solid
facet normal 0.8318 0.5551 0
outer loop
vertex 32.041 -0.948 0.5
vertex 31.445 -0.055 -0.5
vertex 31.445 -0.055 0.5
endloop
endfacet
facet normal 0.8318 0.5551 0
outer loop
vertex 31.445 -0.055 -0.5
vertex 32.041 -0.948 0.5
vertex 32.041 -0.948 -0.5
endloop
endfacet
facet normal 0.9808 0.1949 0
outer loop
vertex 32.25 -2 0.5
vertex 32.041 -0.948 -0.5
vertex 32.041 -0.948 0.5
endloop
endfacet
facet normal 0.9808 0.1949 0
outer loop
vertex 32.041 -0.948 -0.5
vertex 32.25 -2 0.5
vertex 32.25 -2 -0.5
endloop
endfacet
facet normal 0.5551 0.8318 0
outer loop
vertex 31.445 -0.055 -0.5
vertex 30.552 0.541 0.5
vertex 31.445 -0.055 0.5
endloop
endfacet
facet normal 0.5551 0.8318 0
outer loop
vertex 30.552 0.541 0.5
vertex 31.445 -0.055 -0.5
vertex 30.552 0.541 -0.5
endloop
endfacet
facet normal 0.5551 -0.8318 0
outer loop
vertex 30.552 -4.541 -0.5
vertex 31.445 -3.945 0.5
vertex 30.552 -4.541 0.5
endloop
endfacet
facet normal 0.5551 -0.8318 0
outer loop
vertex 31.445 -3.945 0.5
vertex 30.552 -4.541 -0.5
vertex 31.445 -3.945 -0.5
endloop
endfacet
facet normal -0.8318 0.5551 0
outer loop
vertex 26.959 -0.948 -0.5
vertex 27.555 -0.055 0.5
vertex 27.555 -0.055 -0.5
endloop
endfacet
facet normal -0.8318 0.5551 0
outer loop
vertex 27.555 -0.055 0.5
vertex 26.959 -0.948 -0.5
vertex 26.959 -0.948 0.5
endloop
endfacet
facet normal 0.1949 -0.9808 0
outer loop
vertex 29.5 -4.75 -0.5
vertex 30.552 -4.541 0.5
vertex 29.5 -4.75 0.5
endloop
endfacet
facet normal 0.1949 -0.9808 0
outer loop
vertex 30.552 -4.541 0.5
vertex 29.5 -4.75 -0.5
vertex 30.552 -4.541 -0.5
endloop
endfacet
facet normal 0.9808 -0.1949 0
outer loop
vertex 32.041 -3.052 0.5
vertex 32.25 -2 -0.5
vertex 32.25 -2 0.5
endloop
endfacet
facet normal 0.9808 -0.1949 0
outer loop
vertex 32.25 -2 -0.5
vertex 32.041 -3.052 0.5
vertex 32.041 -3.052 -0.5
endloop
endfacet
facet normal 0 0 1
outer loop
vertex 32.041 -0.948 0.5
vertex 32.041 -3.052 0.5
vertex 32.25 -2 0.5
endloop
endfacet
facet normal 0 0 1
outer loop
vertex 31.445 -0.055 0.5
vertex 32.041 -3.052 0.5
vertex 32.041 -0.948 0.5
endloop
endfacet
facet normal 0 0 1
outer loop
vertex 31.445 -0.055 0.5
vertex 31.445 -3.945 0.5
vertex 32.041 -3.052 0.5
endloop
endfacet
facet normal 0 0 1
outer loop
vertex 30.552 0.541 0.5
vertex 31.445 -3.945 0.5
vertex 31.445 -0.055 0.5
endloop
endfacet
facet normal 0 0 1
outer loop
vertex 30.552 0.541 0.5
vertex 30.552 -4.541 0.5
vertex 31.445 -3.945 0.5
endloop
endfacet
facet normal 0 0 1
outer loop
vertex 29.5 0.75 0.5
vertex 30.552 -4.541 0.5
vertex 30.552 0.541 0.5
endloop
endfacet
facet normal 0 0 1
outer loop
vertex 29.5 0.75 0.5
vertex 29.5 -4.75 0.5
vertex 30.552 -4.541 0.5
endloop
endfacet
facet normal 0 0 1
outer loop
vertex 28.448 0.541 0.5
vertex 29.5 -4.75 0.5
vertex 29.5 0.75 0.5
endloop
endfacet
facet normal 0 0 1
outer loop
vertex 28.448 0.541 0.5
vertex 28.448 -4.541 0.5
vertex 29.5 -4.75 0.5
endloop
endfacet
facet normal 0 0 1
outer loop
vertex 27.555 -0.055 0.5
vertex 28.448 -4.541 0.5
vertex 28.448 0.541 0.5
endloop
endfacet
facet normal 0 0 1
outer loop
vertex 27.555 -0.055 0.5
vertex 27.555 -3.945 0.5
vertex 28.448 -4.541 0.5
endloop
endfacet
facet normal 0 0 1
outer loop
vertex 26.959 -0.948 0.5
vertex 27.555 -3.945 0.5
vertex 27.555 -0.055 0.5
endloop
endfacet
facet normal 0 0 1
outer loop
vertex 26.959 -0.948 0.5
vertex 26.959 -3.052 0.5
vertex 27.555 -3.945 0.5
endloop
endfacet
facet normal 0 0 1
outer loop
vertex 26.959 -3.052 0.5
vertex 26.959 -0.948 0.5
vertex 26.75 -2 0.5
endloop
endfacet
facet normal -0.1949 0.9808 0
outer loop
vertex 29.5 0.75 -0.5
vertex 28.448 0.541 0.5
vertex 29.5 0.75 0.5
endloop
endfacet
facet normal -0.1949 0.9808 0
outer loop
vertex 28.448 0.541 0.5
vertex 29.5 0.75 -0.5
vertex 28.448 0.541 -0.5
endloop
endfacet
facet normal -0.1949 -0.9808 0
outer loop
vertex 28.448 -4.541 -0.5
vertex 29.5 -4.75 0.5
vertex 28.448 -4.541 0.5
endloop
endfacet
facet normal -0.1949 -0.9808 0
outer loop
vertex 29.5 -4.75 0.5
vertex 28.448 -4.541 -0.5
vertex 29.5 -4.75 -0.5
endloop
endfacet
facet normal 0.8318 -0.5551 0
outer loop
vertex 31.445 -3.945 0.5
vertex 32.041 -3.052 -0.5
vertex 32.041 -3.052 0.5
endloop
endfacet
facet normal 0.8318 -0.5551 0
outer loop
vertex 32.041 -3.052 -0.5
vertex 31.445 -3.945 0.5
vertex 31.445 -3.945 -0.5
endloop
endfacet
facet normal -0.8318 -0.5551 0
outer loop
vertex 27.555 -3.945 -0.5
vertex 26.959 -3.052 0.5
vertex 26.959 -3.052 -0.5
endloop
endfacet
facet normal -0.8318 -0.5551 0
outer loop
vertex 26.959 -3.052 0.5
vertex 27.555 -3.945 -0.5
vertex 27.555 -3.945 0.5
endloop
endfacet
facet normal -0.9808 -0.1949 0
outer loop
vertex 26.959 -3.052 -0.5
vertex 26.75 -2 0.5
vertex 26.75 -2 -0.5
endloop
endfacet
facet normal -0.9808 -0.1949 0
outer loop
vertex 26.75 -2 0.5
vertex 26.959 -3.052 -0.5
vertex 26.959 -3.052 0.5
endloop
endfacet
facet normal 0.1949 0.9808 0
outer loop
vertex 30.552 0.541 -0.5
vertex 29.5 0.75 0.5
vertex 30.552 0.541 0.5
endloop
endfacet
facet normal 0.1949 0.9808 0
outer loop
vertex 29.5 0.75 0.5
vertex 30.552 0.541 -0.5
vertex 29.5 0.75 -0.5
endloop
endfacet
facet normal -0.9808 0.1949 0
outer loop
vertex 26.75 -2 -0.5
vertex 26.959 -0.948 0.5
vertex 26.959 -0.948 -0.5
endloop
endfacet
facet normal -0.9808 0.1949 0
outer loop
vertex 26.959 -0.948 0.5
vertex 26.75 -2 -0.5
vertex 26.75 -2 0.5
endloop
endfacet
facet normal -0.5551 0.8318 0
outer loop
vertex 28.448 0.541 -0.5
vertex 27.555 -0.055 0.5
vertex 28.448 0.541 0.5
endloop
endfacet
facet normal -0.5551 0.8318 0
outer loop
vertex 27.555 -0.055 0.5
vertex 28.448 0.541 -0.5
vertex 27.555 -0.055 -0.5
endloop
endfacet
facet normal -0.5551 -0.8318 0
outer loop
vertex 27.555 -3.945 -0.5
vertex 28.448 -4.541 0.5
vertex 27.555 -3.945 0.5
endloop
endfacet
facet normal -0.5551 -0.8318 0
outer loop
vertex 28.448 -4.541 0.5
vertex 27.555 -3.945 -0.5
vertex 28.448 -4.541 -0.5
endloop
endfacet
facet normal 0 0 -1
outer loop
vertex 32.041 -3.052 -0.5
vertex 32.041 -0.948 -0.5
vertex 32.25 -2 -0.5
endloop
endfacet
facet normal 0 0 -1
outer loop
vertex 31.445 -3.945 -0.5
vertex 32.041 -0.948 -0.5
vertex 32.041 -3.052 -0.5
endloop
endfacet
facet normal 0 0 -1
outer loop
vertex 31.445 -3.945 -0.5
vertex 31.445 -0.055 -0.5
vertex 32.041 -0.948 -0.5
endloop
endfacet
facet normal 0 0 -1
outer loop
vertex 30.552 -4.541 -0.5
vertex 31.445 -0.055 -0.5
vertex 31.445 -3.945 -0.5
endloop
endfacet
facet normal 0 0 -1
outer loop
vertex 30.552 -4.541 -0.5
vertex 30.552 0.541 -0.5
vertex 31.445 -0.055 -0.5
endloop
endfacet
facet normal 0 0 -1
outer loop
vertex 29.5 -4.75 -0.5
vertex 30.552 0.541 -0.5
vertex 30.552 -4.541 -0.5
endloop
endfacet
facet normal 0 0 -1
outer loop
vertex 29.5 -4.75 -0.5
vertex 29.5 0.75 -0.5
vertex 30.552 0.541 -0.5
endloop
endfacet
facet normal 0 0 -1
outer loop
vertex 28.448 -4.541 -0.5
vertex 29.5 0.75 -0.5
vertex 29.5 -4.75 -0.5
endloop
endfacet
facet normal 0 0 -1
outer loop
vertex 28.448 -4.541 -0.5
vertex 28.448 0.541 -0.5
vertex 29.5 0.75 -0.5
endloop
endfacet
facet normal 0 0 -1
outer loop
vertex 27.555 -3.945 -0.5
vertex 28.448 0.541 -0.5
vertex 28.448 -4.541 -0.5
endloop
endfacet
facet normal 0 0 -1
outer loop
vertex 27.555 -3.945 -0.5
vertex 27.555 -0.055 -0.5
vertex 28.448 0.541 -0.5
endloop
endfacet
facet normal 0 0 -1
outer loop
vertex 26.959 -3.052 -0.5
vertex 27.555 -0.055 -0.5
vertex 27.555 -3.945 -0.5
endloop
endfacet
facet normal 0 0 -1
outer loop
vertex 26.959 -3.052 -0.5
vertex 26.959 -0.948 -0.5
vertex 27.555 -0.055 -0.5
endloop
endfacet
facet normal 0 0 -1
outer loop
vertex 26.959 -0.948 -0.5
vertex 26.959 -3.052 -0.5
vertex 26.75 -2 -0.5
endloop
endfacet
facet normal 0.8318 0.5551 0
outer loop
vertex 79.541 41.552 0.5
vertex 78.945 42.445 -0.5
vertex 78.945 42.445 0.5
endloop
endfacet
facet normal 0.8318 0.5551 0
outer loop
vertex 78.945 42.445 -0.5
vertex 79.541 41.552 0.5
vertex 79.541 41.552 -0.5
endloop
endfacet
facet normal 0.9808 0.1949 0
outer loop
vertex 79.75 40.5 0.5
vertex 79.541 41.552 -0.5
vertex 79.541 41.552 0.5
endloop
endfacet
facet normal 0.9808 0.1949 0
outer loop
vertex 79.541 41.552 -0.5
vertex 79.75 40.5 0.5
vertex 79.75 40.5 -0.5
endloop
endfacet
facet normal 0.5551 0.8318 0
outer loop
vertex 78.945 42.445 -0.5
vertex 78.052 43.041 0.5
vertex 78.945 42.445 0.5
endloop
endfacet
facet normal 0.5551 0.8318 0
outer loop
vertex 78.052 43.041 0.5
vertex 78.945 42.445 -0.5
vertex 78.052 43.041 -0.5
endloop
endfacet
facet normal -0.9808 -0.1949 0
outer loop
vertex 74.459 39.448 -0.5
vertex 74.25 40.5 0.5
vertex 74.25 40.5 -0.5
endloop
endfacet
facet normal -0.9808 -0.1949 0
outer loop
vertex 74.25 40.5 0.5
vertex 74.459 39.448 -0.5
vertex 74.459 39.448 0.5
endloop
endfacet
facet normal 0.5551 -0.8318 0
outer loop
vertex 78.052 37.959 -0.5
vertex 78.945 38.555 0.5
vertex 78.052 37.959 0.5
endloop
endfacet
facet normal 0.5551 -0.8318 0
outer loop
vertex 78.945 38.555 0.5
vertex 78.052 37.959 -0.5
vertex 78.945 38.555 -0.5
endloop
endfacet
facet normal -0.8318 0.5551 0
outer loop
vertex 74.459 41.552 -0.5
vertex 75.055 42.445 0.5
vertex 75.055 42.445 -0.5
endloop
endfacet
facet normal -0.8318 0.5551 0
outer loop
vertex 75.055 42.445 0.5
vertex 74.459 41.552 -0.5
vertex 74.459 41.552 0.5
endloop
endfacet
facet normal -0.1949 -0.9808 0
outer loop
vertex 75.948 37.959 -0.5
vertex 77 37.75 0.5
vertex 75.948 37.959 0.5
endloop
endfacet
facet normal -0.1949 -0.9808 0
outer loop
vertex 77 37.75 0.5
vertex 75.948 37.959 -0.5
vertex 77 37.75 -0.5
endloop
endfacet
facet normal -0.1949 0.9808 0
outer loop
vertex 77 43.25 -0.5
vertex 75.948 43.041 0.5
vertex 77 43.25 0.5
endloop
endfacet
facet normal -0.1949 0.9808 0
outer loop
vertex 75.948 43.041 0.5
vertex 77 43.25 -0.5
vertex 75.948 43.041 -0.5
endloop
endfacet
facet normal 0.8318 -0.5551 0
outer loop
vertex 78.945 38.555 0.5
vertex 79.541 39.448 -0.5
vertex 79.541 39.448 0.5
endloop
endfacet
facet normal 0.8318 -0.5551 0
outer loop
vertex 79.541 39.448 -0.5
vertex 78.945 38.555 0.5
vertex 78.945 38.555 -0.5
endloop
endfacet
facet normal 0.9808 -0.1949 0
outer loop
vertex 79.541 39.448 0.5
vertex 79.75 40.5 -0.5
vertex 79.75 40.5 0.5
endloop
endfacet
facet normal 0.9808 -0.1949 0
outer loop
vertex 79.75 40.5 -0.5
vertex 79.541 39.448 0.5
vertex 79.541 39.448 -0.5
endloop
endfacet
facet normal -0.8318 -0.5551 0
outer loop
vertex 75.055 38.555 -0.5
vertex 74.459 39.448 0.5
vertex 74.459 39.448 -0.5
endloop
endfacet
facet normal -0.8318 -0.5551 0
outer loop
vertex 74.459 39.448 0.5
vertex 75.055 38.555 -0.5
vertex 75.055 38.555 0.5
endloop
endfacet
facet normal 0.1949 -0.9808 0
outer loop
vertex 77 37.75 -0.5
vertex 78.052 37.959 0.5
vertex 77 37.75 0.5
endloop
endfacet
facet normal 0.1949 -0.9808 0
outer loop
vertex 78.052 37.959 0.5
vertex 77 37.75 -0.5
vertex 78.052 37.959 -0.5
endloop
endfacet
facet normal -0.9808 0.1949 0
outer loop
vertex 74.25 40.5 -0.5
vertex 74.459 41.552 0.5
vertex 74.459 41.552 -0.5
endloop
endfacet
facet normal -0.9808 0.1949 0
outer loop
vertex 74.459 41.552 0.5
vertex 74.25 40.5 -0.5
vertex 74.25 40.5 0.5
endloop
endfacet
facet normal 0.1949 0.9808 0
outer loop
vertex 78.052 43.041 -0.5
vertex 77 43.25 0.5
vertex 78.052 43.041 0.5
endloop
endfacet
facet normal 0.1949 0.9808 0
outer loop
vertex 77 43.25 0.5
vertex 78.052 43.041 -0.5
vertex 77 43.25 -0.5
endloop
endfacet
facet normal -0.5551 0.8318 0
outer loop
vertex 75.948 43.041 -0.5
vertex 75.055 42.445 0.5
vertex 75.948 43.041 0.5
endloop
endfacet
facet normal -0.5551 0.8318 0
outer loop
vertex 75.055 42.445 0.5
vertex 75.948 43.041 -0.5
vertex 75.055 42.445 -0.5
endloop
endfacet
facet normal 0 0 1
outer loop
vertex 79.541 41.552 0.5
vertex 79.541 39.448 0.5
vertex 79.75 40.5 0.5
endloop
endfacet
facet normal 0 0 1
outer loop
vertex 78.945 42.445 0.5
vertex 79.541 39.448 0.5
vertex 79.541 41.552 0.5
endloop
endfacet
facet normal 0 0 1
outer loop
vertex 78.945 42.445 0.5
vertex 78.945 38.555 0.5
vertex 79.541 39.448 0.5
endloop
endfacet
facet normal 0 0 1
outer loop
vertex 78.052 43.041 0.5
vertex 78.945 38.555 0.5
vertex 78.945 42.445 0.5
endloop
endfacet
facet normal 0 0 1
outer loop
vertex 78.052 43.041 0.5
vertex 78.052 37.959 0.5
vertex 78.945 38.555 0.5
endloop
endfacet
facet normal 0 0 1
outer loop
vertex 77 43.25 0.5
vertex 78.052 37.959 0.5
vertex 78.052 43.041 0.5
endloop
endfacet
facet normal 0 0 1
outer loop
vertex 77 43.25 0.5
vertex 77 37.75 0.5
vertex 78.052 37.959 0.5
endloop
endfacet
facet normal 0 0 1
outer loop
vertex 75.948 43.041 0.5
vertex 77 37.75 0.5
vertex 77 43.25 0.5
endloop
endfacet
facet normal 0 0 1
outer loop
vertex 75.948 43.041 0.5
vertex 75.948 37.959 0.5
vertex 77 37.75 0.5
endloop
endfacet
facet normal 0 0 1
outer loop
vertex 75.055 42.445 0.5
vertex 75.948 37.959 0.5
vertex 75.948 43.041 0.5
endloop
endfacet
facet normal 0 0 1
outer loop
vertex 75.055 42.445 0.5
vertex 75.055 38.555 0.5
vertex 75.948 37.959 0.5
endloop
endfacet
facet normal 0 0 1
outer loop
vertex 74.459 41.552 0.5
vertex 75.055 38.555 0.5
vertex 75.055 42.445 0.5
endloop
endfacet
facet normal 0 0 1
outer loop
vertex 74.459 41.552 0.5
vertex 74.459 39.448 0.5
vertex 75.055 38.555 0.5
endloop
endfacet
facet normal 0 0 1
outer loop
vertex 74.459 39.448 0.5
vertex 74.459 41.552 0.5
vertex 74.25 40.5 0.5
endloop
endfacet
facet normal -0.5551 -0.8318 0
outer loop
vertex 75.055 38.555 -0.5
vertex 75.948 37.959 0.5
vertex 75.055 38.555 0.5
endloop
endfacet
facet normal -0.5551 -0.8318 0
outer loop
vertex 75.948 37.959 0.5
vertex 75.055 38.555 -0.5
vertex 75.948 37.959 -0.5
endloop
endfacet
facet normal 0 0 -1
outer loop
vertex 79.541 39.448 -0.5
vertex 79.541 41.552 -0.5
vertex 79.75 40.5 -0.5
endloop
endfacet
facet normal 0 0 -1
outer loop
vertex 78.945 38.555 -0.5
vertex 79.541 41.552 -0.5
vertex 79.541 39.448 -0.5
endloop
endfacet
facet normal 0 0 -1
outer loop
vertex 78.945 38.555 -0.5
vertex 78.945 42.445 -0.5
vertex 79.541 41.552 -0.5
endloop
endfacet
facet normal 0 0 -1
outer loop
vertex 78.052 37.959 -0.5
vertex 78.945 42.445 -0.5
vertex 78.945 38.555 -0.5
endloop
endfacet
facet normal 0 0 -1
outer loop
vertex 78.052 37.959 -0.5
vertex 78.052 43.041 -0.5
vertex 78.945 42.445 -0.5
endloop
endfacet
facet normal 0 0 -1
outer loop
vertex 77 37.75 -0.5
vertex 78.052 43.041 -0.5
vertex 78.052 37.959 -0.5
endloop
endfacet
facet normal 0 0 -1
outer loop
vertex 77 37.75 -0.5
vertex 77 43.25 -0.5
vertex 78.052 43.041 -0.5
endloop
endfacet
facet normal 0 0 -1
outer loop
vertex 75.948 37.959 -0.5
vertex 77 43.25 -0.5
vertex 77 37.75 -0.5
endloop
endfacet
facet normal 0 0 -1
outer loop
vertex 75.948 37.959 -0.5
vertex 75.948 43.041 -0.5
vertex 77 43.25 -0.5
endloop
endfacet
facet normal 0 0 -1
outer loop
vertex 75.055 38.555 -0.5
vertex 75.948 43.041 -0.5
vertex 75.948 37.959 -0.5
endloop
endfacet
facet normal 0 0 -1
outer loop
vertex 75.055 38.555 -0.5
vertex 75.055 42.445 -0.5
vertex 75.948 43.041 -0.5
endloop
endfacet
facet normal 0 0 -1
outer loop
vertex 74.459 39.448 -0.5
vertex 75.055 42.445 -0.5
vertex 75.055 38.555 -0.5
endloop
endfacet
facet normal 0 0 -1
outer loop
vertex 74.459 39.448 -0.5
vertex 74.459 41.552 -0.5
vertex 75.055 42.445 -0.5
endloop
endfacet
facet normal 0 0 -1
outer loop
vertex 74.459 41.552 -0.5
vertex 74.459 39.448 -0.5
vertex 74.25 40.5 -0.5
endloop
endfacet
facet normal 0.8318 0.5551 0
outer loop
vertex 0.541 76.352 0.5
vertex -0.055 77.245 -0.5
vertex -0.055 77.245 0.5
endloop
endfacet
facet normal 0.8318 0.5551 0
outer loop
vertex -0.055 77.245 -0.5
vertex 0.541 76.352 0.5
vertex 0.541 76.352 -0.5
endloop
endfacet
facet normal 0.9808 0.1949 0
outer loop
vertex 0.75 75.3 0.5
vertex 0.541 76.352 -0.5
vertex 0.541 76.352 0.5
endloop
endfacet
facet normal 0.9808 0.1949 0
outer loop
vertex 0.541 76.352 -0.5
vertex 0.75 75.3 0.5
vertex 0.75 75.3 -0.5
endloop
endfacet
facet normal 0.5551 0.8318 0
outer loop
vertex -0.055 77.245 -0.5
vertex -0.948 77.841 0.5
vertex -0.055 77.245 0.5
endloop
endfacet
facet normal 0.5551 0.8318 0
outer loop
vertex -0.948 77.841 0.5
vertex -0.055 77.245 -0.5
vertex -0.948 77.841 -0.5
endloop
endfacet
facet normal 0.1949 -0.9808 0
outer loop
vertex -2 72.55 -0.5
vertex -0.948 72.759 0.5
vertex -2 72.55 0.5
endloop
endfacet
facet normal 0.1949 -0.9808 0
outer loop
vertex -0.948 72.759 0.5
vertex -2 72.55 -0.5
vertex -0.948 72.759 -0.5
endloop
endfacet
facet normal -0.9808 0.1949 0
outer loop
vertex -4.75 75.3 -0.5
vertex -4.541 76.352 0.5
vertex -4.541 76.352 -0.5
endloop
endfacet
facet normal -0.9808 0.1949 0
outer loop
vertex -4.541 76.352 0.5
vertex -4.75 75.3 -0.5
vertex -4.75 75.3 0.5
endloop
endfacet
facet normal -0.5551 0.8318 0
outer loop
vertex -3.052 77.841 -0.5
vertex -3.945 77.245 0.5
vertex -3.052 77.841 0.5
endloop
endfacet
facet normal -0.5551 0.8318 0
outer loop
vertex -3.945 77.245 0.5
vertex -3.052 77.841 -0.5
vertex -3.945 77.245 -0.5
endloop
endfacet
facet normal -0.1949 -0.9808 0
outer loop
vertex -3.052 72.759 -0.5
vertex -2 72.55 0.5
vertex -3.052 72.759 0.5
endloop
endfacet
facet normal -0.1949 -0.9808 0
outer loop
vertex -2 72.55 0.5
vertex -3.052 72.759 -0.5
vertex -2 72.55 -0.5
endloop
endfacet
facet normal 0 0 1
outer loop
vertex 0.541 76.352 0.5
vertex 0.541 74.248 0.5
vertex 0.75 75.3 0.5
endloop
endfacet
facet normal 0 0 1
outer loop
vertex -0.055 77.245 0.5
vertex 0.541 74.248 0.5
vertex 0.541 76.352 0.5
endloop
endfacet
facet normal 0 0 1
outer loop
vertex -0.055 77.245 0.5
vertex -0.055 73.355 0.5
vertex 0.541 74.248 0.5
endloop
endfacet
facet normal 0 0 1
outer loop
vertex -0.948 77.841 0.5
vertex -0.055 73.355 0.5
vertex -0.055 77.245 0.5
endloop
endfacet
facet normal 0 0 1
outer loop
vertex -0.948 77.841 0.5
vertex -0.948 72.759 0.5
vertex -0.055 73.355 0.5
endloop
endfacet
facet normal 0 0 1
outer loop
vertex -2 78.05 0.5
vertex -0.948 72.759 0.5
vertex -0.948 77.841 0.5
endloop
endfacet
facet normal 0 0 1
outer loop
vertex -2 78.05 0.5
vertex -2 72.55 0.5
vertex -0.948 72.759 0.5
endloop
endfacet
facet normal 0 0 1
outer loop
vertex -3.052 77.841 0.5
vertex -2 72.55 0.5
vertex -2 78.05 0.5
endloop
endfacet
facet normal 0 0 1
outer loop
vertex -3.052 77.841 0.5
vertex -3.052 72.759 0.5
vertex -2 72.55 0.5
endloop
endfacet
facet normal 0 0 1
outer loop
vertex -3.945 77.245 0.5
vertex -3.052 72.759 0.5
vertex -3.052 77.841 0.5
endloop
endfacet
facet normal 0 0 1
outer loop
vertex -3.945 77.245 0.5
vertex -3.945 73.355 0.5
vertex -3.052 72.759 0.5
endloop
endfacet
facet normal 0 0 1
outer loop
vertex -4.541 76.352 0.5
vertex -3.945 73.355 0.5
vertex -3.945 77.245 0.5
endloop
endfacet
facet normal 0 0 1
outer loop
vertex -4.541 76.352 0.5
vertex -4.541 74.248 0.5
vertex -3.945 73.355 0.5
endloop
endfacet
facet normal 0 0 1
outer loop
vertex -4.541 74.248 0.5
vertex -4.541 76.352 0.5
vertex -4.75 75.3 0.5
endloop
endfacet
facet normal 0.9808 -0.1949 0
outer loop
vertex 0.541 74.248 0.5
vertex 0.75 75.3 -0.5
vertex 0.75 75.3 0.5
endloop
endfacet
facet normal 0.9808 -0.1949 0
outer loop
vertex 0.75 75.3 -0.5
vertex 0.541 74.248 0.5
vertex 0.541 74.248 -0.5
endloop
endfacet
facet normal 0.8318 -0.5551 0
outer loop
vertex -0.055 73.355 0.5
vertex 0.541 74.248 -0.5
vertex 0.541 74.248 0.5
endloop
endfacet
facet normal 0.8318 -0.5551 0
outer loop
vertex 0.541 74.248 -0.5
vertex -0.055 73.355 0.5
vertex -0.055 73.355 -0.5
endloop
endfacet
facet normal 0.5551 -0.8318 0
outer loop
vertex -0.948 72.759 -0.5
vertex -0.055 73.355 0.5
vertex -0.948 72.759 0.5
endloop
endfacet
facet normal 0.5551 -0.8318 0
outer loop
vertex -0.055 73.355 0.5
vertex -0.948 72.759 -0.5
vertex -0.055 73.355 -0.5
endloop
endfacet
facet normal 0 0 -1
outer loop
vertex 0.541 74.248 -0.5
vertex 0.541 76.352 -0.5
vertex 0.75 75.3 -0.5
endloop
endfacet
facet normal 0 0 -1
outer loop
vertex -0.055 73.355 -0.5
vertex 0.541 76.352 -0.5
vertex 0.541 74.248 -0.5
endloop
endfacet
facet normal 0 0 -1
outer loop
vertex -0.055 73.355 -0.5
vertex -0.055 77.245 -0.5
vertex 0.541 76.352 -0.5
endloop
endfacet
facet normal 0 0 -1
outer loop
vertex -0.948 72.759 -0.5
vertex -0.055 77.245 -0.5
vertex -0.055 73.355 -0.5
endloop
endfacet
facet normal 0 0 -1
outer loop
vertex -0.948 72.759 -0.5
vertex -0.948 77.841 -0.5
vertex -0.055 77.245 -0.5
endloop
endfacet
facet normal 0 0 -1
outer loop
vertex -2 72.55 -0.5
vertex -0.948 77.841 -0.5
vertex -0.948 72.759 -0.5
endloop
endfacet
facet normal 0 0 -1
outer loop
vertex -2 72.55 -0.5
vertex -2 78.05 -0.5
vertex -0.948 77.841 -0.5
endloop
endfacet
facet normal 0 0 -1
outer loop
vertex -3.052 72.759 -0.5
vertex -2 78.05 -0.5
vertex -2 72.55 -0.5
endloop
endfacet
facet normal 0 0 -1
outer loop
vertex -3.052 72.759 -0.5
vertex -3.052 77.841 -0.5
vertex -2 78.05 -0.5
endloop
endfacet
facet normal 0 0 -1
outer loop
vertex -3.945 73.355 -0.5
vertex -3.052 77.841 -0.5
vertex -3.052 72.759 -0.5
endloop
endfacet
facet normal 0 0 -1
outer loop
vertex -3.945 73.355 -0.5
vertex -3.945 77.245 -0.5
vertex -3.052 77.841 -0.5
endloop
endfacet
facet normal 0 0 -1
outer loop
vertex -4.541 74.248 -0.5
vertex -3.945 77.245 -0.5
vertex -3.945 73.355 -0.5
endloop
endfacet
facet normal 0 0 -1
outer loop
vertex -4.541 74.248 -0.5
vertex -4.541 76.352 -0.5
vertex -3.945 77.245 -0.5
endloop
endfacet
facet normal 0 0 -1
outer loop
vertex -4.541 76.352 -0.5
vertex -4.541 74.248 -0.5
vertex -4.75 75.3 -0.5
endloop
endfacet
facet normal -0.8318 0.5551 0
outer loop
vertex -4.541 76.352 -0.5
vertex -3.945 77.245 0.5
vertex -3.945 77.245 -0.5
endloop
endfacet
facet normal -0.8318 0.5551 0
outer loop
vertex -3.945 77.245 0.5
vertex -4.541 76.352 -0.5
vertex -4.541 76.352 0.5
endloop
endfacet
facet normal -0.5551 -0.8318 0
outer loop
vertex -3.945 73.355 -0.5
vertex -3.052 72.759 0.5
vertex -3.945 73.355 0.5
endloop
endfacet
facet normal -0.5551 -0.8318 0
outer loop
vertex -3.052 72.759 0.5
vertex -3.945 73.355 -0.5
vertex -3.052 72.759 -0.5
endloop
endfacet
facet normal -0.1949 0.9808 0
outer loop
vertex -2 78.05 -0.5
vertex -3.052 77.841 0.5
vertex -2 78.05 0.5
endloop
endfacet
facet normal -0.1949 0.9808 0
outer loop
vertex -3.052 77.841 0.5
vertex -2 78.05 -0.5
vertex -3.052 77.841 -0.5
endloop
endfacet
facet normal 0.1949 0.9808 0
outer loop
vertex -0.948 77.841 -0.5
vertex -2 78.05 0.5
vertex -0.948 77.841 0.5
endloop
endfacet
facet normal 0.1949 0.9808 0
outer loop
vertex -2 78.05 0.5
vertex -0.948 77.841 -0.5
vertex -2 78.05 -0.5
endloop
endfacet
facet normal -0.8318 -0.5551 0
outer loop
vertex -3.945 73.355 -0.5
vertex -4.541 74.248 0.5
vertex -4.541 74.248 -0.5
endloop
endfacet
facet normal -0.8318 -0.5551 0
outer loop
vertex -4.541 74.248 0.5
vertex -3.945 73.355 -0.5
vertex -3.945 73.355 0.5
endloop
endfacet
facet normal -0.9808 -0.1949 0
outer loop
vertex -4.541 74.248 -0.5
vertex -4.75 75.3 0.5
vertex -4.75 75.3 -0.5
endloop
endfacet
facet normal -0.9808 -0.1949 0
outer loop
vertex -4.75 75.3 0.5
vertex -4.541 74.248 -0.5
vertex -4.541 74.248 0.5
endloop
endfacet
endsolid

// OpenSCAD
// This is just the holes. it had some other measurements, but these are the ones that matter.

color("green") {
    translate([75-45.5, -2]) cylinder(1, d=5.5, $fn=16, center=true);
    translate([75+2, 40.5]) cylinder(1, d=5.5, $fn=16, center=true);
    translate([-2, 75.3]) cylinder(1, d=5.5, $fn=16, center=true);
}
